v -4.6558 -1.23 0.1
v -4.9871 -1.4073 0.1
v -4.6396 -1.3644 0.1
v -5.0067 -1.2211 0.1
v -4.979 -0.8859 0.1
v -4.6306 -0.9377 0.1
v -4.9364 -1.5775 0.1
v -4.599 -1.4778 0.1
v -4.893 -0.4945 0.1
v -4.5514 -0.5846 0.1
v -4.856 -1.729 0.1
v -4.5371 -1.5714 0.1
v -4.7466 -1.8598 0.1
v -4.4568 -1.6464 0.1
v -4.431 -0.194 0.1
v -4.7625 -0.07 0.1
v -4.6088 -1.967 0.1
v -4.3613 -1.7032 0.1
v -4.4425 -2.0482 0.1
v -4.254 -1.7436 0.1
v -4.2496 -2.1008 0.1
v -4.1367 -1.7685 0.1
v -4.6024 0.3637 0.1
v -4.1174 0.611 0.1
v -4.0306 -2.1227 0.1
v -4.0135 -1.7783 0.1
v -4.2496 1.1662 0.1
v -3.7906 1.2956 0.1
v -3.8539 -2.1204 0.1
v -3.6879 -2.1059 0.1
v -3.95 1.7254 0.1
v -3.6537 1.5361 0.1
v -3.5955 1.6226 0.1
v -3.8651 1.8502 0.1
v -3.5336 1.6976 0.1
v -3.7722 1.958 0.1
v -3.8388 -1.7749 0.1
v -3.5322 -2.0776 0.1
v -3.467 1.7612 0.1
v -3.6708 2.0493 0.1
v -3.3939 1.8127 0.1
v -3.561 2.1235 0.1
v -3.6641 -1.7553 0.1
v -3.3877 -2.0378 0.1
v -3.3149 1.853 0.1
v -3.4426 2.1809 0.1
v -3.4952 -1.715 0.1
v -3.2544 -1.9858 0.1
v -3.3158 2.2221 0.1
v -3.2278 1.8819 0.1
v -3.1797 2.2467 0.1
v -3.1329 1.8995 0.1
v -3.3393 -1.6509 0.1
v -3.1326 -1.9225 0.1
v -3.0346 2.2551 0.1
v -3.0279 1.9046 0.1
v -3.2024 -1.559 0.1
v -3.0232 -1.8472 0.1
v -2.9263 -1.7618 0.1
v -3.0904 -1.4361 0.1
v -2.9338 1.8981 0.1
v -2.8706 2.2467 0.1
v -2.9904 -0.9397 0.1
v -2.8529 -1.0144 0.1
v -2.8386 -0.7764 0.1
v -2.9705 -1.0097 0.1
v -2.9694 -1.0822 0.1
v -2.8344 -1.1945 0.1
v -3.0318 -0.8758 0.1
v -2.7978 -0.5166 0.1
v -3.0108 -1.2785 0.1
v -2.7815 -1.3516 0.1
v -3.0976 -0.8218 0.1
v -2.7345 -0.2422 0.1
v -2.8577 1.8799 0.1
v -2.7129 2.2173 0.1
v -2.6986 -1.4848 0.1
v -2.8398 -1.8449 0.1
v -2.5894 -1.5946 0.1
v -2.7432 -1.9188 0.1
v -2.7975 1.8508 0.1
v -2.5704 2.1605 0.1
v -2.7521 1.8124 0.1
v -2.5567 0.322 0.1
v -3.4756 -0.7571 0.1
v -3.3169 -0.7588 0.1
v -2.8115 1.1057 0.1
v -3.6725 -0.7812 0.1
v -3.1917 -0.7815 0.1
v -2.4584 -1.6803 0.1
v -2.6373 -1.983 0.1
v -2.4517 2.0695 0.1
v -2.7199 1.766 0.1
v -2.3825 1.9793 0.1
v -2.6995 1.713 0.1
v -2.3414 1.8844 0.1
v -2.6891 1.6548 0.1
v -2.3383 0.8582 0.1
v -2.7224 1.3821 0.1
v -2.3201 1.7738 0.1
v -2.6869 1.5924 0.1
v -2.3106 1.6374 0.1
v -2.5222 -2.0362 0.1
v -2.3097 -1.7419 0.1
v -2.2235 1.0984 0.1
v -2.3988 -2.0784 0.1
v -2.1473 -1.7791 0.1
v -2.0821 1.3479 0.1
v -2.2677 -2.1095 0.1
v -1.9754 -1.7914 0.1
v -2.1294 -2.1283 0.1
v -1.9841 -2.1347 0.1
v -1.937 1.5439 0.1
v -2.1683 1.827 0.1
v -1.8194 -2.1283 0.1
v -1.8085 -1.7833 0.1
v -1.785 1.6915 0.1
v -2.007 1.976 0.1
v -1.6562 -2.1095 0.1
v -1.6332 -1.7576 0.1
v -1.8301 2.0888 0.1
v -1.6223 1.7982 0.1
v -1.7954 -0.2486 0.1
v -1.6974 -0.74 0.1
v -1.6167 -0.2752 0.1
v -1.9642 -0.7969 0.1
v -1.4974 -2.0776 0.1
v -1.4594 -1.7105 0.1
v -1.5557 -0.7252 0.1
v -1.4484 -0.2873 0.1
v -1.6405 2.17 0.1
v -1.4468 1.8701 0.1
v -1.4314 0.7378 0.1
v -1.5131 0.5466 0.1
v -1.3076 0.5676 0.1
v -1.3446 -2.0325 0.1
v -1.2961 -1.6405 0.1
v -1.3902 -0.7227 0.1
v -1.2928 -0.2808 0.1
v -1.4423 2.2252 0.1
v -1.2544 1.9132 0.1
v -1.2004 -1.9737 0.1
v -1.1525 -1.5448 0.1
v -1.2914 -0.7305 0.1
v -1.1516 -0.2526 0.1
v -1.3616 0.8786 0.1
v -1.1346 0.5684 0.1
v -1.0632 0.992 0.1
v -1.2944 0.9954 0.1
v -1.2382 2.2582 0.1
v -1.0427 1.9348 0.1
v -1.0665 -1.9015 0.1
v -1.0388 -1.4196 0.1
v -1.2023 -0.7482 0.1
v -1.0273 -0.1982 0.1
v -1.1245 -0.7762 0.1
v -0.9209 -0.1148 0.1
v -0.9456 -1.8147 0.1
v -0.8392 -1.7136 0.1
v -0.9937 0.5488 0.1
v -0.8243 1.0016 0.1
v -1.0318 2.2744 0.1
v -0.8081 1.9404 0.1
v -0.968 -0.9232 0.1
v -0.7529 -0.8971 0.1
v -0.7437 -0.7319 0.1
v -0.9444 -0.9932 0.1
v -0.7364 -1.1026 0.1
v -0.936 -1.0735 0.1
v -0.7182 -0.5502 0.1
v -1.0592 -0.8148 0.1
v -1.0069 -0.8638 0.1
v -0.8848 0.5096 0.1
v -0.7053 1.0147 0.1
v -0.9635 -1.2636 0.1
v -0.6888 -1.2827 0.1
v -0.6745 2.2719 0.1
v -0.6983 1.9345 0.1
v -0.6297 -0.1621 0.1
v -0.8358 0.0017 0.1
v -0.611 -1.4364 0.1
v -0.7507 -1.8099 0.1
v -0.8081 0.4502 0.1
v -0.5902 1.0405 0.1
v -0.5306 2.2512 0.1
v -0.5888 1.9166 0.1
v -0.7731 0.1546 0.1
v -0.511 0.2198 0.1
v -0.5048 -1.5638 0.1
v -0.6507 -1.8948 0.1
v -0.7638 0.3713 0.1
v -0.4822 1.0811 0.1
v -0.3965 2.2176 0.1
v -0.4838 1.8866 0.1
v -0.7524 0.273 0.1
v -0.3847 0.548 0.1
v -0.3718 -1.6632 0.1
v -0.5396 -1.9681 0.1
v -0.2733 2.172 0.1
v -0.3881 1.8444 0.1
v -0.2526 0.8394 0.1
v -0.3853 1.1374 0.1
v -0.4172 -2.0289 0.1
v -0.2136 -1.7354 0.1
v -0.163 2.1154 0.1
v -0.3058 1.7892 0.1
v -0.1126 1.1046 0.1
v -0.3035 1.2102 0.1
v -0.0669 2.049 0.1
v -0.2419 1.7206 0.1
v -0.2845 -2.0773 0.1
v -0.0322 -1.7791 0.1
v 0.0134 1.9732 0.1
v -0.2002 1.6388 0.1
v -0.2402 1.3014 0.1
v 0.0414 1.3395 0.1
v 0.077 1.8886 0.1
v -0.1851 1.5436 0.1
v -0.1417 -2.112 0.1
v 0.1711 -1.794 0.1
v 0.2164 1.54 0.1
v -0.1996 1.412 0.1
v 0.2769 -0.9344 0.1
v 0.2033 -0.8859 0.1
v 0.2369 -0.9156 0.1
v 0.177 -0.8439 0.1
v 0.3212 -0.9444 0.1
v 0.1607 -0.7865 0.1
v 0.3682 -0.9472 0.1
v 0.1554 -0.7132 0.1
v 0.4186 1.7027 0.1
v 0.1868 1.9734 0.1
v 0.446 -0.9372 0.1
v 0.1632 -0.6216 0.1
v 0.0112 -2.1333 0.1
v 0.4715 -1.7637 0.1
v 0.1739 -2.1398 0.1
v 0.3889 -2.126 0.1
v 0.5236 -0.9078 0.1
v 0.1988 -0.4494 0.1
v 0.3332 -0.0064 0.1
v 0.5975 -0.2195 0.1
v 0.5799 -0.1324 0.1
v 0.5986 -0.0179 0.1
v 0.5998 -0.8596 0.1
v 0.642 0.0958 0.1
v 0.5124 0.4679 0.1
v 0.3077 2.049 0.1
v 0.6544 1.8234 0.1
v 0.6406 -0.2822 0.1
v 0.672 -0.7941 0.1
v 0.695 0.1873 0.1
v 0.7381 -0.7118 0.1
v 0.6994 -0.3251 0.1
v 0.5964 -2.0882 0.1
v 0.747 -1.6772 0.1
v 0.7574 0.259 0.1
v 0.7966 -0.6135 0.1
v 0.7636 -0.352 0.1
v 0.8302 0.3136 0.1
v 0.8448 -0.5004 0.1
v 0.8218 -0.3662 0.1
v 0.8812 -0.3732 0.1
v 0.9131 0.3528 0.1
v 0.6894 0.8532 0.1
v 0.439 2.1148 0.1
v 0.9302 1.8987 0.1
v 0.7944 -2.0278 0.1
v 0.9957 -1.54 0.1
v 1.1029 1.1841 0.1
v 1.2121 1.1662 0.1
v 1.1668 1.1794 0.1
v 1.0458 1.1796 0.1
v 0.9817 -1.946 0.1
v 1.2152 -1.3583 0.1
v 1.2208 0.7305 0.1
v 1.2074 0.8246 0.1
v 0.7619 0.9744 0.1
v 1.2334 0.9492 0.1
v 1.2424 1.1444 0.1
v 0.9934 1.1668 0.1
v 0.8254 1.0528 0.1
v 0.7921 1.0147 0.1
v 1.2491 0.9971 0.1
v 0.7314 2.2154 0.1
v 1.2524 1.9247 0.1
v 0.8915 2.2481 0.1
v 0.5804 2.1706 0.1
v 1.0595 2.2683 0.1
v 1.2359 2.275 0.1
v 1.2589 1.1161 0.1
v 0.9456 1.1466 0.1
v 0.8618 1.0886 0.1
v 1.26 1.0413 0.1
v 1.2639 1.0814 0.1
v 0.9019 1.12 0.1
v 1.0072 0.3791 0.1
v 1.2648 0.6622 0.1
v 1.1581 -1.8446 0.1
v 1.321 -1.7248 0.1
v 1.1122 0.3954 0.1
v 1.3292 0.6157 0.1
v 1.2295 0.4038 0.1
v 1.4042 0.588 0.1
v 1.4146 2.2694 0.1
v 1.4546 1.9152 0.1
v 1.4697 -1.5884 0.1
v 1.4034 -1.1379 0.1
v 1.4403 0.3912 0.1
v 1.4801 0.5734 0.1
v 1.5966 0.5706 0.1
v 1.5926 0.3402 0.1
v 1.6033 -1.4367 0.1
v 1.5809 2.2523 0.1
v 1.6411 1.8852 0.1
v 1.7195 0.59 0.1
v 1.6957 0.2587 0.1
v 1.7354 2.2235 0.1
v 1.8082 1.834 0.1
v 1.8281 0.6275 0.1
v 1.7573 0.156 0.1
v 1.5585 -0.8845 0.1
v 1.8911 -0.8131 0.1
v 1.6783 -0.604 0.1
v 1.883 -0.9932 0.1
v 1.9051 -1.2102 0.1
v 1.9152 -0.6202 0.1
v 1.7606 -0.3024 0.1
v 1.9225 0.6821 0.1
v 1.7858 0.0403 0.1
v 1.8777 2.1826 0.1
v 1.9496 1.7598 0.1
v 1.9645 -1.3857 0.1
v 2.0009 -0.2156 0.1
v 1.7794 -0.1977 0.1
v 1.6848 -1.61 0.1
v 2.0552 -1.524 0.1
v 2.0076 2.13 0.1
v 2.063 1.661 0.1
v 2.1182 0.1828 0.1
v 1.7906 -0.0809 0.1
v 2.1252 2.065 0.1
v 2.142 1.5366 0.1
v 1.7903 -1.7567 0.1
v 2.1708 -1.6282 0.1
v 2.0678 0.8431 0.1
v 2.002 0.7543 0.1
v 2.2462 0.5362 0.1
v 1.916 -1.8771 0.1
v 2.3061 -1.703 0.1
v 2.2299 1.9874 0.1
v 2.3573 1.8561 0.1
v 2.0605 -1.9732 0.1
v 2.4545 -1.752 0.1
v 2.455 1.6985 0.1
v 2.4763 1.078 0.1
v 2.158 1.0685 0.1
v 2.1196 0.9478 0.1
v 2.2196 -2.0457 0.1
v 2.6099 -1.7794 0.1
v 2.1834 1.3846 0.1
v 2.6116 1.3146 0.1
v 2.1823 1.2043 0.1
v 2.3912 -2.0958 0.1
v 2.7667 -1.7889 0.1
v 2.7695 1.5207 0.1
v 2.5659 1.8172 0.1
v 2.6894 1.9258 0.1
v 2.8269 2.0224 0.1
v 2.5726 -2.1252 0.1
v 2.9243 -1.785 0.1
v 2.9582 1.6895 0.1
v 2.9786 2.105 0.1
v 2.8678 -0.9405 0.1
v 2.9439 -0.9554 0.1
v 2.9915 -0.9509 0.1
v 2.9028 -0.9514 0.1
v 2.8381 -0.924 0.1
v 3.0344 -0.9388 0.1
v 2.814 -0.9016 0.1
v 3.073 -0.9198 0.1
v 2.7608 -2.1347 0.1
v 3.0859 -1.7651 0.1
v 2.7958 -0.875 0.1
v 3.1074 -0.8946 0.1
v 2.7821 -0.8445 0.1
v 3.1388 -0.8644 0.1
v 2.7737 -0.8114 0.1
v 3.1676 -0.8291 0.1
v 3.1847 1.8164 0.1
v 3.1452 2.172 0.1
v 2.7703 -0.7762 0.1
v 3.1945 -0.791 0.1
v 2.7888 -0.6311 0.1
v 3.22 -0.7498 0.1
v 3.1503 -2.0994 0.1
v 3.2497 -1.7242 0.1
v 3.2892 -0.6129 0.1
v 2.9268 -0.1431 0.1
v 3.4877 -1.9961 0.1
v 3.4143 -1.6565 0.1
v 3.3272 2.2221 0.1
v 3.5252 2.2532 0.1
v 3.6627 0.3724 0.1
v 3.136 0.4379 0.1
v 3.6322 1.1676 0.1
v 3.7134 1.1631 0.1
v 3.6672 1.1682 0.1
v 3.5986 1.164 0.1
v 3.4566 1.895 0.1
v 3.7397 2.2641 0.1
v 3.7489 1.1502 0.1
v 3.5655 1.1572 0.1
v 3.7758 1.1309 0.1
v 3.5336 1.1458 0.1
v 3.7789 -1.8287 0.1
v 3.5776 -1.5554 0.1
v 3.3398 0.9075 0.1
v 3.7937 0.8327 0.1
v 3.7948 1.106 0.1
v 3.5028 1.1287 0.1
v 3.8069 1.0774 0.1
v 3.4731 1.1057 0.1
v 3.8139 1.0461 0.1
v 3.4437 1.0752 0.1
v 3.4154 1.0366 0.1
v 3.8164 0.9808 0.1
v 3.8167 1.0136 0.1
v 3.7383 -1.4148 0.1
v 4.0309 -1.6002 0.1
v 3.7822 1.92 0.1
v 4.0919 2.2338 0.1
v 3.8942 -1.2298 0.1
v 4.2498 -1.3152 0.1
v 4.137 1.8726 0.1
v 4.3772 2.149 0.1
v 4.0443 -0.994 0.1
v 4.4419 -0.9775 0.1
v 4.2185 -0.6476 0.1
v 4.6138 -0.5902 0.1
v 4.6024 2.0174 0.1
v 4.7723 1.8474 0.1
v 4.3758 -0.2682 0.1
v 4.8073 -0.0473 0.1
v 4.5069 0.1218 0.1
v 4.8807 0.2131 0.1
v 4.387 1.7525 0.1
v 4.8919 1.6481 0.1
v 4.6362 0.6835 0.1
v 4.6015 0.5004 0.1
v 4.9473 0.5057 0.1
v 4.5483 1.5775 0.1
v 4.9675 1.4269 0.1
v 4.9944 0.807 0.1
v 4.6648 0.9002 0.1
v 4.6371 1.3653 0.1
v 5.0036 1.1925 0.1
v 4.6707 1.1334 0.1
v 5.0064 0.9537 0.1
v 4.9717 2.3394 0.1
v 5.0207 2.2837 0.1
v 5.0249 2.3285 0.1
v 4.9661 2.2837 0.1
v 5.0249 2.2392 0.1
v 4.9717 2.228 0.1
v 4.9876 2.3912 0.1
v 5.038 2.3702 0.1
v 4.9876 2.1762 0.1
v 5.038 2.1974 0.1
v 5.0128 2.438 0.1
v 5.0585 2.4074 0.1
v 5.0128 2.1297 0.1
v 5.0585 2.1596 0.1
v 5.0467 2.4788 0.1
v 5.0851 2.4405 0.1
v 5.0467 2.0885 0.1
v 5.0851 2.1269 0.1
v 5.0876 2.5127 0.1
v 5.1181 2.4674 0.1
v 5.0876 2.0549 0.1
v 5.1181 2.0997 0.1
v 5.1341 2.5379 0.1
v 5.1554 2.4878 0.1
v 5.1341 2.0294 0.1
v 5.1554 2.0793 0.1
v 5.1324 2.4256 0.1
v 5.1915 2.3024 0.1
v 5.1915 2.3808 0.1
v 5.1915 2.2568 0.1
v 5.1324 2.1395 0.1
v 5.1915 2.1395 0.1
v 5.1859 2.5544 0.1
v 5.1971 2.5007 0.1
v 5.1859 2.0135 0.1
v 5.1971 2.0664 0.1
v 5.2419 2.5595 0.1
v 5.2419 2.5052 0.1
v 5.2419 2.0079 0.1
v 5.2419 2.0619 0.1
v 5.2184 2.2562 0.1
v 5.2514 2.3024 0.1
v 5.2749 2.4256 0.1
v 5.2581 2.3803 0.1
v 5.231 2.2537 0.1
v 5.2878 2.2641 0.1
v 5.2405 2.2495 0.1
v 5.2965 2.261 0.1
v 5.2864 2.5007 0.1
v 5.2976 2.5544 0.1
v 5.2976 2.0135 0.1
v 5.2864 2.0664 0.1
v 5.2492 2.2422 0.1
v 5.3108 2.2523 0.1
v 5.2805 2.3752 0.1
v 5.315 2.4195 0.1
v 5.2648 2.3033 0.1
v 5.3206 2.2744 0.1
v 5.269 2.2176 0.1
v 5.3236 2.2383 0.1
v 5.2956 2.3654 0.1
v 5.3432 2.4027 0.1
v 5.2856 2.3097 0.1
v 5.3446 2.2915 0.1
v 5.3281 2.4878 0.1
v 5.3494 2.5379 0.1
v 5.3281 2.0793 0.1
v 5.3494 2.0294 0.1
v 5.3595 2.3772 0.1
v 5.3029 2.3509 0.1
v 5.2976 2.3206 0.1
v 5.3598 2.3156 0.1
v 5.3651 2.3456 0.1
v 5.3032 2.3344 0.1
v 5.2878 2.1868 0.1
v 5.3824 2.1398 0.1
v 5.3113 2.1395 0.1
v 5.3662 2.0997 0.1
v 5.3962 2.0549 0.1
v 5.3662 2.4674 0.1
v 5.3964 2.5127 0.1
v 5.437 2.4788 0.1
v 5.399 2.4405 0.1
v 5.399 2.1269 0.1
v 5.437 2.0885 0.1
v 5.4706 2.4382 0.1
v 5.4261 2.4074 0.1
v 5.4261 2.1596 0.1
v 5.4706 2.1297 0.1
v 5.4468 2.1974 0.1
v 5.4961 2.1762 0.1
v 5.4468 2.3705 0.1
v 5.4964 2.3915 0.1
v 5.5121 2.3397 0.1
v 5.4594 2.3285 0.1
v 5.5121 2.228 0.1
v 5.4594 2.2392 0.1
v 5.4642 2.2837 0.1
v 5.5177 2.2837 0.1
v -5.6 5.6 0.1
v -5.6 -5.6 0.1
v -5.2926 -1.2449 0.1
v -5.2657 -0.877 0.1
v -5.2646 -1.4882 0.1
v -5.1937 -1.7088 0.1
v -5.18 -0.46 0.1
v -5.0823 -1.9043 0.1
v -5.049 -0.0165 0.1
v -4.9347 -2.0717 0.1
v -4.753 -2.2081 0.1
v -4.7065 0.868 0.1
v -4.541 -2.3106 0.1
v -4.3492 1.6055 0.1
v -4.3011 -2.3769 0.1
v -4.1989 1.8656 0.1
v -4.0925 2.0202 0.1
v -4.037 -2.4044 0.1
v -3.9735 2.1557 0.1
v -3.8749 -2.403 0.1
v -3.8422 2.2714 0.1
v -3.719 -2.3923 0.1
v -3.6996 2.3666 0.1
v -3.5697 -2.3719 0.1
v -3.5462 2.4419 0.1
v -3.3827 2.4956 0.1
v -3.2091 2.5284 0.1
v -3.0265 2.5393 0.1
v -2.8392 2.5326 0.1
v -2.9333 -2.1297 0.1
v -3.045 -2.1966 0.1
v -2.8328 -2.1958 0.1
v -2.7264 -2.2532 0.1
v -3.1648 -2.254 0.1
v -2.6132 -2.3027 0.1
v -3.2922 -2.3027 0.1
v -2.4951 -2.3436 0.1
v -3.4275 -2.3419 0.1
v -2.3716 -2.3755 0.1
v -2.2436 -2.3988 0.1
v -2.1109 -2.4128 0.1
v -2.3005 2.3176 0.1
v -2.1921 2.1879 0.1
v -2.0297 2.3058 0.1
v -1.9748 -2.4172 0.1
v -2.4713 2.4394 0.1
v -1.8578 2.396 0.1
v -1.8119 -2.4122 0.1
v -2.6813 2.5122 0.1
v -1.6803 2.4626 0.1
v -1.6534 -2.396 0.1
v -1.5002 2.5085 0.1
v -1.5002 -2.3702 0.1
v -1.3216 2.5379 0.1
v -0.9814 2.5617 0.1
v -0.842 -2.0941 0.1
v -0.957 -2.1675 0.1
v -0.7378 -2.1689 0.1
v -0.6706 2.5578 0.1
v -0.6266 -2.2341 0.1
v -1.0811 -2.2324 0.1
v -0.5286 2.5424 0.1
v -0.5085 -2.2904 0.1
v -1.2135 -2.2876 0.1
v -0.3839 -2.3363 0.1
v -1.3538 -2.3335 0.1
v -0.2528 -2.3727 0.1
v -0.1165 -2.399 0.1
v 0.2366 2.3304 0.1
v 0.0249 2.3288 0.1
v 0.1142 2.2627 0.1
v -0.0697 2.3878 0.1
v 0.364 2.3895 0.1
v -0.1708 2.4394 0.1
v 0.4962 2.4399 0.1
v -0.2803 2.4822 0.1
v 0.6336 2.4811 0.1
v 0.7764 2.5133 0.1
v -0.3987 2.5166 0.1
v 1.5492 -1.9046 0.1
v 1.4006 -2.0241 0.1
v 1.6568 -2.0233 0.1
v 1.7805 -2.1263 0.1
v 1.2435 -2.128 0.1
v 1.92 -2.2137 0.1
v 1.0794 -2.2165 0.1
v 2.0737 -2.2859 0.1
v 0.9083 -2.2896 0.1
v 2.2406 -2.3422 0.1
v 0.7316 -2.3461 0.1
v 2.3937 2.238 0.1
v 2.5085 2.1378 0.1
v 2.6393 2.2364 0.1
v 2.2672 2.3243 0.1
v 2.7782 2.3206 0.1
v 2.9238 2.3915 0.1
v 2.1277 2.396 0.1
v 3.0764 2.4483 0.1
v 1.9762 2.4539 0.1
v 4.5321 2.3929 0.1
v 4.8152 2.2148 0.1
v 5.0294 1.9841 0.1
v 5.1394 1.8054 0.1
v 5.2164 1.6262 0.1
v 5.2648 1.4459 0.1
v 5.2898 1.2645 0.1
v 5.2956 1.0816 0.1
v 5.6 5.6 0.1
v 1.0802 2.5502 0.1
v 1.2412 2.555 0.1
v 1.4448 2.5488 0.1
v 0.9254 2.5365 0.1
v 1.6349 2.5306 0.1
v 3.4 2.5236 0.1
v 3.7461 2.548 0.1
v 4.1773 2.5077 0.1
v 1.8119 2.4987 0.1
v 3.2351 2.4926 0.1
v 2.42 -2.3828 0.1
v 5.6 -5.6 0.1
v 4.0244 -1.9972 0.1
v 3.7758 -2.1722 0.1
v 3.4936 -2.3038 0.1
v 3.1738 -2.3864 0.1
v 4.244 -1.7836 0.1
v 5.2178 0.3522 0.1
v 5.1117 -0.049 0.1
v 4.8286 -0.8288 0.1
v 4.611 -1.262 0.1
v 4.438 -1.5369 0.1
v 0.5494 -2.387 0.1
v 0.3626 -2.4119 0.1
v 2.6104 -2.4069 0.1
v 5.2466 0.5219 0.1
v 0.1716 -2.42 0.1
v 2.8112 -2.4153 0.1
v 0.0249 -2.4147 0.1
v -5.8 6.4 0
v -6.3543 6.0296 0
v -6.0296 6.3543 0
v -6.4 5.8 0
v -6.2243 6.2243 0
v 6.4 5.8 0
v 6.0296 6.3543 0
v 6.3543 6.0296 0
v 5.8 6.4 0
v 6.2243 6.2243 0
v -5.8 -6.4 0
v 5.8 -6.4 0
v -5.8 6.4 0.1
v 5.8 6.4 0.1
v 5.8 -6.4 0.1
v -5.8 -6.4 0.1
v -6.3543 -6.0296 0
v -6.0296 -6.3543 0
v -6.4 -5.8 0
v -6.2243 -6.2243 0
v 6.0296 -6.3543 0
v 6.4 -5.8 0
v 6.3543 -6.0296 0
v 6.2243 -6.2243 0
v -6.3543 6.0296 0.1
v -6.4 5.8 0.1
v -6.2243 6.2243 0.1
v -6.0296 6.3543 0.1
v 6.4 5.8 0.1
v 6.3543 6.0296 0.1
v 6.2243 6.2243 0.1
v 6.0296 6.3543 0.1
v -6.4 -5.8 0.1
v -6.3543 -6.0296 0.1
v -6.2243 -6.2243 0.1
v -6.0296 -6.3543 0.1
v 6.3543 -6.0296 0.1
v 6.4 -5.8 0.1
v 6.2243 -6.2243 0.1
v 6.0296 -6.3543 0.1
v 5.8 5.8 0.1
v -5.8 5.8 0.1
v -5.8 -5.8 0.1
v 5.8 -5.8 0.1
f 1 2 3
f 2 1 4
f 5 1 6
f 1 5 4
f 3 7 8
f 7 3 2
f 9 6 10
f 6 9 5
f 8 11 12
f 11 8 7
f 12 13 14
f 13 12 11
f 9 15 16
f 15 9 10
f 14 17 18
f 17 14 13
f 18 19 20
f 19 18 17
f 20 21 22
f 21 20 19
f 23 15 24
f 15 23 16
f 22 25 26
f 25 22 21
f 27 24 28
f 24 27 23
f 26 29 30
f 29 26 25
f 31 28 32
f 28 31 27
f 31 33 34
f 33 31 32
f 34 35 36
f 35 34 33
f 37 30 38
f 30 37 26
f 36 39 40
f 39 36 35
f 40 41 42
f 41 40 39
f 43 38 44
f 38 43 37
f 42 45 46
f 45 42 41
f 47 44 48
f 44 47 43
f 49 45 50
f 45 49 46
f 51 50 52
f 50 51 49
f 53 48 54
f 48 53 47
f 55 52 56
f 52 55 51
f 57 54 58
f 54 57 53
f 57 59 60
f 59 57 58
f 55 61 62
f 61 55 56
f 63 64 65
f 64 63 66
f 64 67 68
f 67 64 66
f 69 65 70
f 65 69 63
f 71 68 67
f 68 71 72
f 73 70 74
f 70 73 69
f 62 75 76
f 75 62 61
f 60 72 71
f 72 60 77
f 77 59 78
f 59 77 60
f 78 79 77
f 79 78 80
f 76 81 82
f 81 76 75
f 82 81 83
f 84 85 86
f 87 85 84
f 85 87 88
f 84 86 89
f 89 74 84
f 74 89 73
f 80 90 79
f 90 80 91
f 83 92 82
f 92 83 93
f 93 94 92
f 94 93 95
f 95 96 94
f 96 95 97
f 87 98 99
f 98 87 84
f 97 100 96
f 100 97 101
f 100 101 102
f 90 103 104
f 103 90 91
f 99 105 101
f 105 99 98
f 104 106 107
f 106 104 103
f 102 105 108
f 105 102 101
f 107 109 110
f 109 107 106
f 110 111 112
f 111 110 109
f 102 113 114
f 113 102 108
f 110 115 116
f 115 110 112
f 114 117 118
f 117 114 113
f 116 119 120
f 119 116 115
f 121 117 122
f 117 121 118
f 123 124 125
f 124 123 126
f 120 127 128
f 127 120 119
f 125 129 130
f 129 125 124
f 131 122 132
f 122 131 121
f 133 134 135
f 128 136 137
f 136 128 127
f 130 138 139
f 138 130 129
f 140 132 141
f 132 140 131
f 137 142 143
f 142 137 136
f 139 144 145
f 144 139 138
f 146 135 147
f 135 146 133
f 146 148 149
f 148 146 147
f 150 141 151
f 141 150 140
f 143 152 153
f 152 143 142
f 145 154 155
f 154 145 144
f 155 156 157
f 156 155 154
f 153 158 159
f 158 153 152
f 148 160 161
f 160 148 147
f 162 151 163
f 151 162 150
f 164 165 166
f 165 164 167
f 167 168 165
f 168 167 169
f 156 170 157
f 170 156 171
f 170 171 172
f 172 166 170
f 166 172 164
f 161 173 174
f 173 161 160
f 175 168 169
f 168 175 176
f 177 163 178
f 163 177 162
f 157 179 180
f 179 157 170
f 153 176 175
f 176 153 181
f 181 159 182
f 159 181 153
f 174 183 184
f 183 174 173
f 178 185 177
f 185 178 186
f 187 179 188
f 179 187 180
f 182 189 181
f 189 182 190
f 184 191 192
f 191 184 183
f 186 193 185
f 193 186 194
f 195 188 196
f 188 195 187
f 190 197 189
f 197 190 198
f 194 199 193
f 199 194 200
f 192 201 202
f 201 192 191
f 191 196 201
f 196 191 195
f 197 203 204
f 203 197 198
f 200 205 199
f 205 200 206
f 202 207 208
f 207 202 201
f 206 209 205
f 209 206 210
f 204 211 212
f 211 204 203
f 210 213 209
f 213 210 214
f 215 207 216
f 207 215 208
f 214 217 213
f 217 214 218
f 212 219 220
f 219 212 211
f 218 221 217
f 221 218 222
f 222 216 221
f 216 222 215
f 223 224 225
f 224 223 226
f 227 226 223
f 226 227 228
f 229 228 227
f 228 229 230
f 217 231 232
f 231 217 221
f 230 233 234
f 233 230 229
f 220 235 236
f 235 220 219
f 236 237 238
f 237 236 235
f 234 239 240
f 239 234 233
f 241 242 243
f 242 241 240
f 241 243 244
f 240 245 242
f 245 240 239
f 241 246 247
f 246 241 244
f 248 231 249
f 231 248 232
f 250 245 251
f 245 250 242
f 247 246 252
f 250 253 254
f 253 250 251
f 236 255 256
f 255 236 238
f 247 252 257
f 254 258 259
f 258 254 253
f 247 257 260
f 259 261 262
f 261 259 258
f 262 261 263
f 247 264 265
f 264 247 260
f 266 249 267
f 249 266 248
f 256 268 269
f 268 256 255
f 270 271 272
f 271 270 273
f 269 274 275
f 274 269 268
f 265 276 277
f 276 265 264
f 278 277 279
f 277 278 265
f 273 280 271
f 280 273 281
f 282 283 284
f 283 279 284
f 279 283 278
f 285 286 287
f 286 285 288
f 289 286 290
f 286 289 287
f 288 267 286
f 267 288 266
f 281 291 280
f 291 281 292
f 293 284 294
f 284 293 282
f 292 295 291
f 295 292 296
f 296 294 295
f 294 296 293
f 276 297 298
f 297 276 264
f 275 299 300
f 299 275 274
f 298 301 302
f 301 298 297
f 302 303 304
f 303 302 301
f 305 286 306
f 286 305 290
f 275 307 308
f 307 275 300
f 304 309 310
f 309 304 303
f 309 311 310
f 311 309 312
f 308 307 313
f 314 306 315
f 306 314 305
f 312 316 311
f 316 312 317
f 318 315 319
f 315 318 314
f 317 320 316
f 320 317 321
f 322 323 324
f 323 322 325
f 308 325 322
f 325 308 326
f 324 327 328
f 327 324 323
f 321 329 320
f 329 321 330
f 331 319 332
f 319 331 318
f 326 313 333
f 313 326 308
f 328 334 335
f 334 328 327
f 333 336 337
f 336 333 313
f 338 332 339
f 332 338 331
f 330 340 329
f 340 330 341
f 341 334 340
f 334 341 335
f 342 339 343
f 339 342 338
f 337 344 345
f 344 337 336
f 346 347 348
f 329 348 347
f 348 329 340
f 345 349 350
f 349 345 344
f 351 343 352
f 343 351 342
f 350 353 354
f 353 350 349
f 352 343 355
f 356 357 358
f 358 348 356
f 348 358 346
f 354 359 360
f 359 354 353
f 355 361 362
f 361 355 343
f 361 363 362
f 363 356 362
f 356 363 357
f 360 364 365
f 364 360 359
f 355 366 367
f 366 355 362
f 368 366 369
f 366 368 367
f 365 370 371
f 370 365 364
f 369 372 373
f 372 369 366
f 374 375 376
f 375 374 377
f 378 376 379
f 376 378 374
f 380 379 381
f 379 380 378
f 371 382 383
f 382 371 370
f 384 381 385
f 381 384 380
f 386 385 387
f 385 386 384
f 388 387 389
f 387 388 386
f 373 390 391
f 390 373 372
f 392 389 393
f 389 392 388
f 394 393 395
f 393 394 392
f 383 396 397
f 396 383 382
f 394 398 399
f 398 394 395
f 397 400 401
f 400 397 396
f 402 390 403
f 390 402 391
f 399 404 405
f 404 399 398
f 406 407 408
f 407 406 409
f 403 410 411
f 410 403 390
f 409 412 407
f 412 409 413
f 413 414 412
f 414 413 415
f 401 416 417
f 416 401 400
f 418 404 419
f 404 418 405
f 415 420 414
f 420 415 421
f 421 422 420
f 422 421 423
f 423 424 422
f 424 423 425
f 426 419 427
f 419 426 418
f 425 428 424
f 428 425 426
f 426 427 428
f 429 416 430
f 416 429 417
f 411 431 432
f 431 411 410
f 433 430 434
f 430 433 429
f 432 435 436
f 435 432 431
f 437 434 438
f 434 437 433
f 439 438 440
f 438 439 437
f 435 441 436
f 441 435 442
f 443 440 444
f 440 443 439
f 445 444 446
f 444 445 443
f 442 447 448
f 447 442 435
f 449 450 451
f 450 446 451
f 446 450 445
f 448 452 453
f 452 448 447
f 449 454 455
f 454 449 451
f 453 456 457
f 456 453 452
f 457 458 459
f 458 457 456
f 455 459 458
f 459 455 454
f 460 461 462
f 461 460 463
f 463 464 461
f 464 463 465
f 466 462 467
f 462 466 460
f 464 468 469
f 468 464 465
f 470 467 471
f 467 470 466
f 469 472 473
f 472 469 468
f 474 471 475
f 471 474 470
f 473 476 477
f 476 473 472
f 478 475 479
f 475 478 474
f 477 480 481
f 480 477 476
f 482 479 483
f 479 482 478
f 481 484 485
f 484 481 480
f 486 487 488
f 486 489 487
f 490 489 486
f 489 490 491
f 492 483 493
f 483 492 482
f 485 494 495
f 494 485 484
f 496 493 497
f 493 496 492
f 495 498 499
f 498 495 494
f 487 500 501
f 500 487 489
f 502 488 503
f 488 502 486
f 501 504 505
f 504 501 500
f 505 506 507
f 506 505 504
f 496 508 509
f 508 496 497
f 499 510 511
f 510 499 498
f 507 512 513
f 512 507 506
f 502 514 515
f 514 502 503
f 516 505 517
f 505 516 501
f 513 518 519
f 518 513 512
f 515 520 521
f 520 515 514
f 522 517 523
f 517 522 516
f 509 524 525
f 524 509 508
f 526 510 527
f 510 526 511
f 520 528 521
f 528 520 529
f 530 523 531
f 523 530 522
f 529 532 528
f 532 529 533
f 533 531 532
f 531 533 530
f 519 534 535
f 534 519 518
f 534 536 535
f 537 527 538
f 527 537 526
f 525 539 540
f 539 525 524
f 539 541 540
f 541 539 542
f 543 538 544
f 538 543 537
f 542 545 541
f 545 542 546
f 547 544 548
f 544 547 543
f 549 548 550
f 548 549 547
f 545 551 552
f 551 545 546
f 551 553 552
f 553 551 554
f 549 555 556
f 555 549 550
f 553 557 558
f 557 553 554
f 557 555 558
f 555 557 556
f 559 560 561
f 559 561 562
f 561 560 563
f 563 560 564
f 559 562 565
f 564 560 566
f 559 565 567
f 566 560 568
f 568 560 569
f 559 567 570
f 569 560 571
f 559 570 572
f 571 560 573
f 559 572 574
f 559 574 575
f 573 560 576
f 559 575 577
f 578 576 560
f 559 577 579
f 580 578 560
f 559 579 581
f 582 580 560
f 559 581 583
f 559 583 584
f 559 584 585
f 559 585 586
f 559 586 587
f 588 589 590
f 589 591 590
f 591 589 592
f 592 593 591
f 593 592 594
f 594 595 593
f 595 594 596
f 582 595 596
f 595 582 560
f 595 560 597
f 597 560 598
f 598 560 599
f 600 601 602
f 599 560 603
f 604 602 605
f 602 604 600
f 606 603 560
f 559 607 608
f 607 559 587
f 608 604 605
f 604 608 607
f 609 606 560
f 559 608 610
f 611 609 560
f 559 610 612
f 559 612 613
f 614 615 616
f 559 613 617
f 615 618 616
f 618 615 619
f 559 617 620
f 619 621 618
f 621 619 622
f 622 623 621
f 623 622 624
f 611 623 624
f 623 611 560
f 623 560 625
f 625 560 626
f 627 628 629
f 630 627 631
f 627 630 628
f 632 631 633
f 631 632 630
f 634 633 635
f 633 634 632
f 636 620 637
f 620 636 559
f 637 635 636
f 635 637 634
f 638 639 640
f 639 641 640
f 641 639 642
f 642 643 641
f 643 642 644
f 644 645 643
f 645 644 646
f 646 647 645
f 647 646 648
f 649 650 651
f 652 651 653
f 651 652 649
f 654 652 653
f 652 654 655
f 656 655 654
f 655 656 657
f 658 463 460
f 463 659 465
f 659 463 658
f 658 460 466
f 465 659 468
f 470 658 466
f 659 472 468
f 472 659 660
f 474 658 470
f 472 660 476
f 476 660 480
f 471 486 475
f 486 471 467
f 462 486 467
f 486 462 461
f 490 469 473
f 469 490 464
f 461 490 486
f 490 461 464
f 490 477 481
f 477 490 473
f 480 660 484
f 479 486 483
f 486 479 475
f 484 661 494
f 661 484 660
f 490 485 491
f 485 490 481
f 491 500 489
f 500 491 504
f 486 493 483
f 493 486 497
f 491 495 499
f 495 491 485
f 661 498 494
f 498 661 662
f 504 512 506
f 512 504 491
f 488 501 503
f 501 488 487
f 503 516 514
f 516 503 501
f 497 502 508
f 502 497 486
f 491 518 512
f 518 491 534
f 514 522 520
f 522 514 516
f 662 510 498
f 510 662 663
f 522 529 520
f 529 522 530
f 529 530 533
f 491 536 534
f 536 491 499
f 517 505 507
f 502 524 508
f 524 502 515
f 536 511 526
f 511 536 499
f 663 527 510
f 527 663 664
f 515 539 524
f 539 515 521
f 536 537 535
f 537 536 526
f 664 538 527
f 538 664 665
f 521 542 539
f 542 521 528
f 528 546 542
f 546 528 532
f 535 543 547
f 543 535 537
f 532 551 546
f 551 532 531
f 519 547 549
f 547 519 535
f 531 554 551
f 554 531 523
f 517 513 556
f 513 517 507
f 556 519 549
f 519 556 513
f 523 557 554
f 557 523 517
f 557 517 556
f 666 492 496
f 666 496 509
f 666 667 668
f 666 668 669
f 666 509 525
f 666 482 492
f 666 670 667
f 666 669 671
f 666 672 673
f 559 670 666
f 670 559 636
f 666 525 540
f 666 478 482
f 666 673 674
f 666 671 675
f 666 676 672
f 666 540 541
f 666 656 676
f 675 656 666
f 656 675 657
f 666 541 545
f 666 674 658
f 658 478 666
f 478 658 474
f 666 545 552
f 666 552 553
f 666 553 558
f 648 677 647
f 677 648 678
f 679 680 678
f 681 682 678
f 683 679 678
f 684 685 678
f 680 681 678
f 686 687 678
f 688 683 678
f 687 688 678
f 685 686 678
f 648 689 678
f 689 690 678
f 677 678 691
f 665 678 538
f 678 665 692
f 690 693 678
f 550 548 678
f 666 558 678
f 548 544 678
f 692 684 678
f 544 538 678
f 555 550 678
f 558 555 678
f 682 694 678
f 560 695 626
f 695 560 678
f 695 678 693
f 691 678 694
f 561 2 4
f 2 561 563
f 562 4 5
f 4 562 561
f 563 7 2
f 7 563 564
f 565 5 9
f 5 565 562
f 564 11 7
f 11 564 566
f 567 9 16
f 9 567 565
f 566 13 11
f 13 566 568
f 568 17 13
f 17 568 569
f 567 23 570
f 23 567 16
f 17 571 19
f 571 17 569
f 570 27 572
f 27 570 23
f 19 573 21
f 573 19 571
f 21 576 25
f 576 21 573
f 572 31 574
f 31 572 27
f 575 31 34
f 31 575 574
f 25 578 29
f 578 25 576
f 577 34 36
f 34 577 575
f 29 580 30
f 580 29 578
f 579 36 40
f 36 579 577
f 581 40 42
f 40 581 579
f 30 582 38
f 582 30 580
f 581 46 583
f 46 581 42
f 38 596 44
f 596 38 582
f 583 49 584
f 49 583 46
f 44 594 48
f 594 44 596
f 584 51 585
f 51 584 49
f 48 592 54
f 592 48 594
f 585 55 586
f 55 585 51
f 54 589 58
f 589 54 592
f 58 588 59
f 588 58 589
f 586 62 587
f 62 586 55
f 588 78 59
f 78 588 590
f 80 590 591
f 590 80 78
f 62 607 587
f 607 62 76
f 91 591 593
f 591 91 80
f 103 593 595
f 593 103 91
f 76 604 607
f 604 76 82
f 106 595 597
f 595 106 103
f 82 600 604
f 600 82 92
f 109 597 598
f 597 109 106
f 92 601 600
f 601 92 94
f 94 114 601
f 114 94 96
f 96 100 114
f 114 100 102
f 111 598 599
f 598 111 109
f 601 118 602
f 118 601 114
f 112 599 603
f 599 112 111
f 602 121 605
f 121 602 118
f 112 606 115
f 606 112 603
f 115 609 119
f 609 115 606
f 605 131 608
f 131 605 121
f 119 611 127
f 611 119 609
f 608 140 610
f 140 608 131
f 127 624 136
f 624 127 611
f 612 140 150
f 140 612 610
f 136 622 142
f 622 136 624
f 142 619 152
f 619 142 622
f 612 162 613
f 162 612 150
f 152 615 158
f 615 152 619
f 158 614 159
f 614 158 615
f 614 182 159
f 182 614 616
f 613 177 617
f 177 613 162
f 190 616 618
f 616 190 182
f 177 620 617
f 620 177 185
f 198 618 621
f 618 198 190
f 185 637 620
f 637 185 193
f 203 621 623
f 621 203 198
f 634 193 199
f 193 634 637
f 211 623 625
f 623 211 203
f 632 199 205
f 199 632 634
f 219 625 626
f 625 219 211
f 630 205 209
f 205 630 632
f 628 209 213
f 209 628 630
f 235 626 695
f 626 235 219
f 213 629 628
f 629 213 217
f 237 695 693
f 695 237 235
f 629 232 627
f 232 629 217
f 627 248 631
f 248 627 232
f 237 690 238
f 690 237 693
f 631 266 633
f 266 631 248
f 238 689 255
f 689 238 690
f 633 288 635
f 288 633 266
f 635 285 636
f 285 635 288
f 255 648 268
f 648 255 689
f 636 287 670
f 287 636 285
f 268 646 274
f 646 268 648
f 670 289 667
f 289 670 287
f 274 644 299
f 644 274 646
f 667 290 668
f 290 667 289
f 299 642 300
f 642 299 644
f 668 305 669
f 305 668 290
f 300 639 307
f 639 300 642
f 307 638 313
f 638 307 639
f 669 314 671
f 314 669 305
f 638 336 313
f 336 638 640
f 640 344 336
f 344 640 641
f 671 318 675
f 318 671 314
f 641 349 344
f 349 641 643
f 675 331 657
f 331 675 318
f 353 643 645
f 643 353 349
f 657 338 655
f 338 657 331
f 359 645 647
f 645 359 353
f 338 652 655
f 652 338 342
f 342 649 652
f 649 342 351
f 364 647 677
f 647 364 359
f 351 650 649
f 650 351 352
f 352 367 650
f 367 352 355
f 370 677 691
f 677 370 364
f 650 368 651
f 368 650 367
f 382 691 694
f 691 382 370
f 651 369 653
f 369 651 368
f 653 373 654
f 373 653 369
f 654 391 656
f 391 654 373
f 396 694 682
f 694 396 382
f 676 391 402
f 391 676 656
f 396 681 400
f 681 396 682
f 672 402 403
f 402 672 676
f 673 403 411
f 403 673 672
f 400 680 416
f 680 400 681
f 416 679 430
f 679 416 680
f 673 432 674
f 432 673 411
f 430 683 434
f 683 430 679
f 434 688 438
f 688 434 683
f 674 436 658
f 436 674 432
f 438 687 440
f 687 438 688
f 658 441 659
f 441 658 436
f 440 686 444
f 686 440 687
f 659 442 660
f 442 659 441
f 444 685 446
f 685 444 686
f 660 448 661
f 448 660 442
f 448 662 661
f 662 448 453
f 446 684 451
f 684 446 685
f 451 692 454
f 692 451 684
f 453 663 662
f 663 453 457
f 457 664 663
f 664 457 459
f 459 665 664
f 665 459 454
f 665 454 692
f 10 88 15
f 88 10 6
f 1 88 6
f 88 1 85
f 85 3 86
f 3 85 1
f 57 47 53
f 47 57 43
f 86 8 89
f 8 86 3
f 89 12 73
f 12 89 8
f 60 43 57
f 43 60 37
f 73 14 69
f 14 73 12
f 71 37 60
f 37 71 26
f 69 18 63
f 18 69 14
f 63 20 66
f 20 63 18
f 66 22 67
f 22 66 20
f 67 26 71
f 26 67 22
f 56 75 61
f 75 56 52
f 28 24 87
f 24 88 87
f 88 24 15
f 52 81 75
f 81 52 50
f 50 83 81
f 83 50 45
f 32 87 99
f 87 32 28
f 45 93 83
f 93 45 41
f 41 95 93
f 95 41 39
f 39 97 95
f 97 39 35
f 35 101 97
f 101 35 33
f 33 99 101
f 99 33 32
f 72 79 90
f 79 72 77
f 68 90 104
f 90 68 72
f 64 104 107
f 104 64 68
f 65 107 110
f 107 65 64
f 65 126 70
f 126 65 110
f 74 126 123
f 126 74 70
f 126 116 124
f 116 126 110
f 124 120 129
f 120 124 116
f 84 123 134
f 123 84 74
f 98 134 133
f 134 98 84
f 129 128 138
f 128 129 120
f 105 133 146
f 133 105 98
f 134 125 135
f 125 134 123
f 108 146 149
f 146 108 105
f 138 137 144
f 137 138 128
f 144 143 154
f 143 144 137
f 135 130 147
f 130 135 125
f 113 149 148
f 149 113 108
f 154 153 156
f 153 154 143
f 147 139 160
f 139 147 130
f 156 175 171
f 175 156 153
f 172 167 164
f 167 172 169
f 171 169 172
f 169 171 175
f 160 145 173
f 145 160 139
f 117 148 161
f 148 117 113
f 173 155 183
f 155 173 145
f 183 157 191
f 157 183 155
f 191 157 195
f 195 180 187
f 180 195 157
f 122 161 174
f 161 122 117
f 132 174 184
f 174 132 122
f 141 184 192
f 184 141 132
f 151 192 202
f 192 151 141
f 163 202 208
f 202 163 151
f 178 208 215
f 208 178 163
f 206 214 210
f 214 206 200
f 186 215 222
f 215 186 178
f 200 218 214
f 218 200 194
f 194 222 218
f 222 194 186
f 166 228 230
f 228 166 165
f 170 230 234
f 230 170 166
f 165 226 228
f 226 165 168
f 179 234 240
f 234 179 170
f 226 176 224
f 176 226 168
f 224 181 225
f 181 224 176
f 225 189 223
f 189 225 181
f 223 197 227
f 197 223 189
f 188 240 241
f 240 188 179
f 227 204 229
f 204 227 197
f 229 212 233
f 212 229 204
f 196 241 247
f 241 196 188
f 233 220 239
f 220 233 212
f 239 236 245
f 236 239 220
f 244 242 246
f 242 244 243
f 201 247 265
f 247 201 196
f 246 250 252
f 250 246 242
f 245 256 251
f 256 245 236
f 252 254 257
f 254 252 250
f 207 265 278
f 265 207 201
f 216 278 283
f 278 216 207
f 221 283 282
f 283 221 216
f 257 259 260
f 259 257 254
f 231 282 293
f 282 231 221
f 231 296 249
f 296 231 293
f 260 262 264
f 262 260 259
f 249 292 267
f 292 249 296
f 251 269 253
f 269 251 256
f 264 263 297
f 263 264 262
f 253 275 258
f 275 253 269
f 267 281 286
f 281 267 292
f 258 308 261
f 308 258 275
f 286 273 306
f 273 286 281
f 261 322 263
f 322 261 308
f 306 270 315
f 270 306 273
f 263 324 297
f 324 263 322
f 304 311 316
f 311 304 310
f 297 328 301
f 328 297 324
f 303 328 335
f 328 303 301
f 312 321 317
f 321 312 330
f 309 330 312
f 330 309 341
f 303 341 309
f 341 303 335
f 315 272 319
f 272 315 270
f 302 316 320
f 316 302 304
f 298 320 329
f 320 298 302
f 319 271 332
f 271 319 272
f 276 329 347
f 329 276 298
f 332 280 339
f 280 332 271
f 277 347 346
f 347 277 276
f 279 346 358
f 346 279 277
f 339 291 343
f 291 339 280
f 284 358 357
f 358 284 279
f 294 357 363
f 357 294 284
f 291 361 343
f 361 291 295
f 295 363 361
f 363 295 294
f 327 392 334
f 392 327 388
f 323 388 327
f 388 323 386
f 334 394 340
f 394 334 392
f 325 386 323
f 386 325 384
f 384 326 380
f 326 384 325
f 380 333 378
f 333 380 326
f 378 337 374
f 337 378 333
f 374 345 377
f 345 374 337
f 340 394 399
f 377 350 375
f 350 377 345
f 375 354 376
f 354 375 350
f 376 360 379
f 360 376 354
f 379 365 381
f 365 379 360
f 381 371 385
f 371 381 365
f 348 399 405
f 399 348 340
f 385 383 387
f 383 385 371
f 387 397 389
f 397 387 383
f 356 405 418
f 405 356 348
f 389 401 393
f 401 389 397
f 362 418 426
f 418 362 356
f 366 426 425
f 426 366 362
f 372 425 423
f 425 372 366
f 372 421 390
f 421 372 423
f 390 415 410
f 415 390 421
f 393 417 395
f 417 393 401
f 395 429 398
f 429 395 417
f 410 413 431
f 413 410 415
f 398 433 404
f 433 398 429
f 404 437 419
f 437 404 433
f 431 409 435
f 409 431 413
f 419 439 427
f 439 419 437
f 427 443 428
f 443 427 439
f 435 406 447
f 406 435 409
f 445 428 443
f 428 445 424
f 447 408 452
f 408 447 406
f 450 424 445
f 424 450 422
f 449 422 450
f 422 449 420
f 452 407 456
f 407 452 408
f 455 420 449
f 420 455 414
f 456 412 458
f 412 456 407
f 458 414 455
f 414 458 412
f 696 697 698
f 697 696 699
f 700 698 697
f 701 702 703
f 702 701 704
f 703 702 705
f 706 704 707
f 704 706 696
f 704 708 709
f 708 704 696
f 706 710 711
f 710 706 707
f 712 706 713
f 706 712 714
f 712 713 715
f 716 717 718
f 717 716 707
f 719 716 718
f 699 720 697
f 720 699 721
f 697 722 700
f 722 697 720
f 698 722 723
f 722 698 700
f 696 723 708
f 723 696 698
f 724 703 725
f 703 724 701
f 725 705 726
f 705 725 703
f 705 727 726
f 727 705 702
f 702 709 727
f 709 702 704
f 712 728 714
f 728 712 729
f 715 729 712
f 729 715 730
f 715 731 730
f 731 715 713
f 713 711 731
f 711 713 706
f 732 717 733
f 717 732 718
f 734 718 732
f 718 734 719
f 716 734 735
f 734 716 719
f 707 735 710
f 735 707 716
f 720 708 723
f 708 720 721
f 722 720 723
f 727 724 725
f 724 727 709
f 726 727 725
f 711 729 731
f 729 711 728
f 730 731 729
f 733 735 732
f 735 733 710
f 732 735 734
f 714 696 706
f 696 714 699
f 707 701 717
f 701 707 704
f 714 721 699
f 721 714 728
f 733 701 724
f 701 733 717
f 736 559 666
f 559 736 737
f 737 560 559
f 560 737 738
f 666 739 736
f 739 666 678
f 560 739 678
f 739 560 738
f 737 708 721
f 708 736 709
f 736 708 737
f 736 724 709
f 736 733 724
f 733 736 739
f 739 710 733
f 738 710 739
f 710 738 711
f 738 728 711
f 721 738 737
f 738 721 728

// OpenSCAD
use <../lib.scad>
use <../p/1-4chrd.scad>
use <../p/1-4cyli.scad>
use <../p/box3u12.scad>
use <../p/logo-lego-2.scad>
$fa=1; $fs=0.2;
function ldraw_lib__4142921c(realsolid=false) = [
// 0 Sticker  1.6 x  1.6 with Lego Logo with Closed "O" on Red Background
// 0 Name: 4142921c.dat
// 0 Author: Massimo Maso [Sirio]
// 0 !LDRAW_ORG Part UPDATE 2022-05
// 0 !LICENSE Licensed under CC BY 2.0 and CC BY 4.0 : see CAreadme.txt
// 
// 0 BFC CERTIFY CCW
  [0,"BFC","CERTIFY"],
  [0,"BFC","CCW"],
// 
// 0 !KEYWORDS City, Set 3439, town
// 
// 0 !HISTORY 2022-09-15 [PTadmin] Official Update 2022-05
// 
// 
// 0 // Subpart
// 1 16 0 -.25 0 .7 0 0 0 0 1 0 -.7 0 logo-lego-2.dat
  [1,16,0,-.25,0,.7,0,0,0,0,1,0,-.7,0, ldraw_lib__logo_lego_2(realsolid)],
// 0 // Primitives
// 1 16 -14.5 0 14.5 -1.5 0 0 0 -1 0 0 0 1.5 1-4chrd.dat
  [1,16,-14.5,0,14.5,-1.5,0,0,0,-1,0,0,0,1.5, ldraw_lib__1_4chrd(realsolid)],
// 1 16 14.5 0 14.5 1.5 0 0 0 -1 0 0 0 1.5 1-4chrd.dat
  [1,16,14.5,0,14.5,1.5,0,0,0,-1,0,0,0,1.5, ldraw_lib__1_4chrd(realsolid)],
// 1 16 0 -.25 0 14.5 0 0 0 .25 0 0 0 16 box3u12.dat
  [1,16,0,-.25,0,14.5,0,0,0,.25,0,0,0,16, ldraw_lib__box3u12(realsolid)],
// 1 16 -14.5 0 -14.5 -1.5 0 0 0 -1 0 0 0 -1.5 1-4chrd.dat
  [1,16,-14.5,0,-14.5,-1.5,0,0,0,-1,0,0,0,-1.5, ldraw_lib__1_4chrd(realsolid)],
// 1 16 14.5 0 -14.5 1.5 0 0 0 -1 0 0 0 -1.5 1-4chrd.dat
  [1,16,14.5,0,-14.5,1.5,0,0,0,-1,0,0,0,-1.5, ldraw_lib__1_4chrd(realsolid)],
// 1 16 -14.5 0 14.5 -1.5 0 0 0 -.25 0 0 0 1.5 1-4cyli.dat
  [1,16,-14.5,0,14.5,-1.5,0,0,0,-.25,0,0,0,1.5, ldraw_lib__1_4cyli(realsolid)],
// 1 16 14.5 0 14.5 1.5 0 0 0 -.25 0 0 0 1.5 1-4cyli.dat
  [1,16,14.5,0,14.5,1.5,0,0,0,-.25,0,0,0,1.5, ldraw_lib__1_4cyli(realsolid)],
// 1 16 -14.5 0 -14.5 -1.5 0 0 0 -.25 0 0 0 -1.5 1-4cyli.dat
  [1,16,-14.5,0,-14.5,-1.5,0,0,0,-.25,0,0,0,-1.5, ldraw_lib__1_4cyli(realsolid)],
// 1 16 14.5 0 -14.5 1.5 0 0 0 -.25 0 0 0 -1.5 1-4cyli.dat
  [1,16,14.5,0,-14.5,1.5,0,0,0,-.25,0,0,0,-1.5, ldraw_lib__1_4cyli(realsolid)],
// 1 15 -14.5 -.25 14.5 0 0 -1.5 0 1 0 1.5 0 0 1-4chrd.dat
  [1,15,-14.5,-.25,14.5,0,0,-1.5,0,1,0,1.5,0,0, ldraw_lib__1_4chrd(realsolid)],
// 1 15 14.5 -.25 14.5 1.5 0 0 0 1 0 0 0 1.5 1-4chrd.dat
  [1,15,14.5,-.25,14.5,1.5,0,0,0,1,0,0,0,1.5, ldraw_lib__1_4chrd(realsolid)],
// 1 15 -14.5 -.25 -14.5 -1.5 0 0 0 1 0 0 0 -1.5 1-4chrd.dat
  [1,15,-14.5,-.25,-14.5,-1.5,0,0,0,1,0,0,0,-1.5, ldraw_lib__1_4chrd(realsolid)],
// 1 15 14.5 -.25 -14.5 1.5 0 0 0 1 0 0 0 -1.5 1-4chrd.dat
  [1,15,14.5,-.25,-14.5,1.5,0,0,0,1,0,0,0,-1.5, ldraw_lib__1_4chrd(realsolid)],
// 0 // Bottom face
// 4 16 -14.5 0 16 -14.5 0 -16 -16 0 -14.5 -16 0 14.5
  [4,16,-14.5,0,16,-14.5,0,-16,-16,0,-14.5,-16,0,14.5],
// 4 16 14.5 0 16 16 0 14.5 16 0 -14.5 14.5 0 -16
  [4,16,14.5,0,16,16,0,14.5,16,0,-14.5,14.5,0,-16],
// 0 // Lateral face
// 4 16 -16 0 14.5 -16 0 -14.5 -16 -.25 -14.5 -16 -.25 14.5
  [4,16,-16,0,14.5,-16,0,-14.5,-16,-.25,-14.5,-16,-.25,14.5],
// 4 16 16 0 14.5 16 -.25 14.5 16 -.25 -14.5 16 0 -14.5
  [4,16,16,0,14.5,16,-.25,14.5,16,-.25,-14.5,16,0,-14.5],
// 0 // Top face
// 0 // Black frame
// 4 0 -14.5 -.25 14.5 -14 -.25 14 14 -.25 14 14.5 -.25 14.5
  [4,0,-14.5,-.25,14.5,-14,-.25,14,14,-.25,14,14.5,-.25,14.5],
// 4 0 -14.5 -.25 14.5 -14.5 -.25 -14.5 -14 -.25 -14 -14 -.25 14
  [4,0,-14.5,-.25,14.5,-14.5,-.25,-14.5,-14,-.25,-14,-14,-.25,14],
// 4 0 14.5 -.25 -14.5 14.5 -.25 14.5 14 -.25 14 14 -.25 -14
  [4,0,14.5,-.25,-14.5,14.5,-.25,14.5,14,-.25,14,14,-.25,-14],
// 4 0 14.5 -.25 -14.5 14 -.25 -14 -14 -.25 -14 -14.5 -.25 -14.5
  [4,0,14.5,-.25,-14.5,14,-.25,-14,-14,-.25,-14,-14.5,-.25,-14.5],
// 0 // White border
// 3 15 -14.5 -.25 14.5 -14.5 -.25 16 -16 -.25 14.5
  [3,15,-14.5,-.25,14.5,-14.5,-.25,16,-16,-.25,14.5],
// 4 15 -14.5 -.25 14.5 14.5 -.25 14.5 14.5 -.25 16 -14.5 -.25 16
  [4,15,-14.5,-.25,14.5,14.5,-.25,14.5,14.5,-.25,16,-14.5,-.25,16],
// 3 15 14.5 -.25 14.5 16 -.25 14.5 14.5 -.25 16
  [3,15,14.5,-.25,14.5,16,-.25,14.5,14.5,-.25,16],
// 4 15 14.5 -.25 14.5 14.5 -.25 -14.5 16 -.25 -14.5 16 -.25 14.5
  [4,15,14.5,-.25,14.5,14.5,-.25,-14.5,16,-.25,-14.5,16,-.25,14.5],
// 3 15 14.5 -.25 -14.5 14.5 -.25 -16 16 -.25 -14.5
  [3,15,14.5,-.25,-14.5,14.5,-.25,-16,16,-.25,-14.5],
// 4 15 14.5 -.25 -14.5 -14.5 -.25 -14.5 -14.5 -.25 -16 14.5 -.25 -16
  [4,15,14.5,-.25,-14.5,-14.5,-.25,-14.5,-14.5,-.25,-16,14.5,-.25,-16],
// 3 15 -14.5 -.25 -14.5 -16 -.25 -14.5 -14.5 -.25 -16
  [3,15,-14.5,-.25,-14.5,-16,-.25,-14.5,-14.5,-.25,-16],
// 4 15 -14.5 -.25 -14.5 -14.5 -.25 14.5 -16 -.25 14.5 -16 -.25 -14.5
  [4,15,-14.5,-.25,-14.5,-14.5,-.25,14.5,-16,-.25,14.5,-16,-.25,-14.5],
];
module ldraw_lib__4142921c(step=0, col=false, unit=2/5, alt=false, line=0.2, solid=!$preview)
    makepoly(ldraw_lib__4142921c(solid), step=step, col=col, unit=unit, alt=alt, line=line, solid=solid);
ldraw_lib__4142921c(line=0.2);
